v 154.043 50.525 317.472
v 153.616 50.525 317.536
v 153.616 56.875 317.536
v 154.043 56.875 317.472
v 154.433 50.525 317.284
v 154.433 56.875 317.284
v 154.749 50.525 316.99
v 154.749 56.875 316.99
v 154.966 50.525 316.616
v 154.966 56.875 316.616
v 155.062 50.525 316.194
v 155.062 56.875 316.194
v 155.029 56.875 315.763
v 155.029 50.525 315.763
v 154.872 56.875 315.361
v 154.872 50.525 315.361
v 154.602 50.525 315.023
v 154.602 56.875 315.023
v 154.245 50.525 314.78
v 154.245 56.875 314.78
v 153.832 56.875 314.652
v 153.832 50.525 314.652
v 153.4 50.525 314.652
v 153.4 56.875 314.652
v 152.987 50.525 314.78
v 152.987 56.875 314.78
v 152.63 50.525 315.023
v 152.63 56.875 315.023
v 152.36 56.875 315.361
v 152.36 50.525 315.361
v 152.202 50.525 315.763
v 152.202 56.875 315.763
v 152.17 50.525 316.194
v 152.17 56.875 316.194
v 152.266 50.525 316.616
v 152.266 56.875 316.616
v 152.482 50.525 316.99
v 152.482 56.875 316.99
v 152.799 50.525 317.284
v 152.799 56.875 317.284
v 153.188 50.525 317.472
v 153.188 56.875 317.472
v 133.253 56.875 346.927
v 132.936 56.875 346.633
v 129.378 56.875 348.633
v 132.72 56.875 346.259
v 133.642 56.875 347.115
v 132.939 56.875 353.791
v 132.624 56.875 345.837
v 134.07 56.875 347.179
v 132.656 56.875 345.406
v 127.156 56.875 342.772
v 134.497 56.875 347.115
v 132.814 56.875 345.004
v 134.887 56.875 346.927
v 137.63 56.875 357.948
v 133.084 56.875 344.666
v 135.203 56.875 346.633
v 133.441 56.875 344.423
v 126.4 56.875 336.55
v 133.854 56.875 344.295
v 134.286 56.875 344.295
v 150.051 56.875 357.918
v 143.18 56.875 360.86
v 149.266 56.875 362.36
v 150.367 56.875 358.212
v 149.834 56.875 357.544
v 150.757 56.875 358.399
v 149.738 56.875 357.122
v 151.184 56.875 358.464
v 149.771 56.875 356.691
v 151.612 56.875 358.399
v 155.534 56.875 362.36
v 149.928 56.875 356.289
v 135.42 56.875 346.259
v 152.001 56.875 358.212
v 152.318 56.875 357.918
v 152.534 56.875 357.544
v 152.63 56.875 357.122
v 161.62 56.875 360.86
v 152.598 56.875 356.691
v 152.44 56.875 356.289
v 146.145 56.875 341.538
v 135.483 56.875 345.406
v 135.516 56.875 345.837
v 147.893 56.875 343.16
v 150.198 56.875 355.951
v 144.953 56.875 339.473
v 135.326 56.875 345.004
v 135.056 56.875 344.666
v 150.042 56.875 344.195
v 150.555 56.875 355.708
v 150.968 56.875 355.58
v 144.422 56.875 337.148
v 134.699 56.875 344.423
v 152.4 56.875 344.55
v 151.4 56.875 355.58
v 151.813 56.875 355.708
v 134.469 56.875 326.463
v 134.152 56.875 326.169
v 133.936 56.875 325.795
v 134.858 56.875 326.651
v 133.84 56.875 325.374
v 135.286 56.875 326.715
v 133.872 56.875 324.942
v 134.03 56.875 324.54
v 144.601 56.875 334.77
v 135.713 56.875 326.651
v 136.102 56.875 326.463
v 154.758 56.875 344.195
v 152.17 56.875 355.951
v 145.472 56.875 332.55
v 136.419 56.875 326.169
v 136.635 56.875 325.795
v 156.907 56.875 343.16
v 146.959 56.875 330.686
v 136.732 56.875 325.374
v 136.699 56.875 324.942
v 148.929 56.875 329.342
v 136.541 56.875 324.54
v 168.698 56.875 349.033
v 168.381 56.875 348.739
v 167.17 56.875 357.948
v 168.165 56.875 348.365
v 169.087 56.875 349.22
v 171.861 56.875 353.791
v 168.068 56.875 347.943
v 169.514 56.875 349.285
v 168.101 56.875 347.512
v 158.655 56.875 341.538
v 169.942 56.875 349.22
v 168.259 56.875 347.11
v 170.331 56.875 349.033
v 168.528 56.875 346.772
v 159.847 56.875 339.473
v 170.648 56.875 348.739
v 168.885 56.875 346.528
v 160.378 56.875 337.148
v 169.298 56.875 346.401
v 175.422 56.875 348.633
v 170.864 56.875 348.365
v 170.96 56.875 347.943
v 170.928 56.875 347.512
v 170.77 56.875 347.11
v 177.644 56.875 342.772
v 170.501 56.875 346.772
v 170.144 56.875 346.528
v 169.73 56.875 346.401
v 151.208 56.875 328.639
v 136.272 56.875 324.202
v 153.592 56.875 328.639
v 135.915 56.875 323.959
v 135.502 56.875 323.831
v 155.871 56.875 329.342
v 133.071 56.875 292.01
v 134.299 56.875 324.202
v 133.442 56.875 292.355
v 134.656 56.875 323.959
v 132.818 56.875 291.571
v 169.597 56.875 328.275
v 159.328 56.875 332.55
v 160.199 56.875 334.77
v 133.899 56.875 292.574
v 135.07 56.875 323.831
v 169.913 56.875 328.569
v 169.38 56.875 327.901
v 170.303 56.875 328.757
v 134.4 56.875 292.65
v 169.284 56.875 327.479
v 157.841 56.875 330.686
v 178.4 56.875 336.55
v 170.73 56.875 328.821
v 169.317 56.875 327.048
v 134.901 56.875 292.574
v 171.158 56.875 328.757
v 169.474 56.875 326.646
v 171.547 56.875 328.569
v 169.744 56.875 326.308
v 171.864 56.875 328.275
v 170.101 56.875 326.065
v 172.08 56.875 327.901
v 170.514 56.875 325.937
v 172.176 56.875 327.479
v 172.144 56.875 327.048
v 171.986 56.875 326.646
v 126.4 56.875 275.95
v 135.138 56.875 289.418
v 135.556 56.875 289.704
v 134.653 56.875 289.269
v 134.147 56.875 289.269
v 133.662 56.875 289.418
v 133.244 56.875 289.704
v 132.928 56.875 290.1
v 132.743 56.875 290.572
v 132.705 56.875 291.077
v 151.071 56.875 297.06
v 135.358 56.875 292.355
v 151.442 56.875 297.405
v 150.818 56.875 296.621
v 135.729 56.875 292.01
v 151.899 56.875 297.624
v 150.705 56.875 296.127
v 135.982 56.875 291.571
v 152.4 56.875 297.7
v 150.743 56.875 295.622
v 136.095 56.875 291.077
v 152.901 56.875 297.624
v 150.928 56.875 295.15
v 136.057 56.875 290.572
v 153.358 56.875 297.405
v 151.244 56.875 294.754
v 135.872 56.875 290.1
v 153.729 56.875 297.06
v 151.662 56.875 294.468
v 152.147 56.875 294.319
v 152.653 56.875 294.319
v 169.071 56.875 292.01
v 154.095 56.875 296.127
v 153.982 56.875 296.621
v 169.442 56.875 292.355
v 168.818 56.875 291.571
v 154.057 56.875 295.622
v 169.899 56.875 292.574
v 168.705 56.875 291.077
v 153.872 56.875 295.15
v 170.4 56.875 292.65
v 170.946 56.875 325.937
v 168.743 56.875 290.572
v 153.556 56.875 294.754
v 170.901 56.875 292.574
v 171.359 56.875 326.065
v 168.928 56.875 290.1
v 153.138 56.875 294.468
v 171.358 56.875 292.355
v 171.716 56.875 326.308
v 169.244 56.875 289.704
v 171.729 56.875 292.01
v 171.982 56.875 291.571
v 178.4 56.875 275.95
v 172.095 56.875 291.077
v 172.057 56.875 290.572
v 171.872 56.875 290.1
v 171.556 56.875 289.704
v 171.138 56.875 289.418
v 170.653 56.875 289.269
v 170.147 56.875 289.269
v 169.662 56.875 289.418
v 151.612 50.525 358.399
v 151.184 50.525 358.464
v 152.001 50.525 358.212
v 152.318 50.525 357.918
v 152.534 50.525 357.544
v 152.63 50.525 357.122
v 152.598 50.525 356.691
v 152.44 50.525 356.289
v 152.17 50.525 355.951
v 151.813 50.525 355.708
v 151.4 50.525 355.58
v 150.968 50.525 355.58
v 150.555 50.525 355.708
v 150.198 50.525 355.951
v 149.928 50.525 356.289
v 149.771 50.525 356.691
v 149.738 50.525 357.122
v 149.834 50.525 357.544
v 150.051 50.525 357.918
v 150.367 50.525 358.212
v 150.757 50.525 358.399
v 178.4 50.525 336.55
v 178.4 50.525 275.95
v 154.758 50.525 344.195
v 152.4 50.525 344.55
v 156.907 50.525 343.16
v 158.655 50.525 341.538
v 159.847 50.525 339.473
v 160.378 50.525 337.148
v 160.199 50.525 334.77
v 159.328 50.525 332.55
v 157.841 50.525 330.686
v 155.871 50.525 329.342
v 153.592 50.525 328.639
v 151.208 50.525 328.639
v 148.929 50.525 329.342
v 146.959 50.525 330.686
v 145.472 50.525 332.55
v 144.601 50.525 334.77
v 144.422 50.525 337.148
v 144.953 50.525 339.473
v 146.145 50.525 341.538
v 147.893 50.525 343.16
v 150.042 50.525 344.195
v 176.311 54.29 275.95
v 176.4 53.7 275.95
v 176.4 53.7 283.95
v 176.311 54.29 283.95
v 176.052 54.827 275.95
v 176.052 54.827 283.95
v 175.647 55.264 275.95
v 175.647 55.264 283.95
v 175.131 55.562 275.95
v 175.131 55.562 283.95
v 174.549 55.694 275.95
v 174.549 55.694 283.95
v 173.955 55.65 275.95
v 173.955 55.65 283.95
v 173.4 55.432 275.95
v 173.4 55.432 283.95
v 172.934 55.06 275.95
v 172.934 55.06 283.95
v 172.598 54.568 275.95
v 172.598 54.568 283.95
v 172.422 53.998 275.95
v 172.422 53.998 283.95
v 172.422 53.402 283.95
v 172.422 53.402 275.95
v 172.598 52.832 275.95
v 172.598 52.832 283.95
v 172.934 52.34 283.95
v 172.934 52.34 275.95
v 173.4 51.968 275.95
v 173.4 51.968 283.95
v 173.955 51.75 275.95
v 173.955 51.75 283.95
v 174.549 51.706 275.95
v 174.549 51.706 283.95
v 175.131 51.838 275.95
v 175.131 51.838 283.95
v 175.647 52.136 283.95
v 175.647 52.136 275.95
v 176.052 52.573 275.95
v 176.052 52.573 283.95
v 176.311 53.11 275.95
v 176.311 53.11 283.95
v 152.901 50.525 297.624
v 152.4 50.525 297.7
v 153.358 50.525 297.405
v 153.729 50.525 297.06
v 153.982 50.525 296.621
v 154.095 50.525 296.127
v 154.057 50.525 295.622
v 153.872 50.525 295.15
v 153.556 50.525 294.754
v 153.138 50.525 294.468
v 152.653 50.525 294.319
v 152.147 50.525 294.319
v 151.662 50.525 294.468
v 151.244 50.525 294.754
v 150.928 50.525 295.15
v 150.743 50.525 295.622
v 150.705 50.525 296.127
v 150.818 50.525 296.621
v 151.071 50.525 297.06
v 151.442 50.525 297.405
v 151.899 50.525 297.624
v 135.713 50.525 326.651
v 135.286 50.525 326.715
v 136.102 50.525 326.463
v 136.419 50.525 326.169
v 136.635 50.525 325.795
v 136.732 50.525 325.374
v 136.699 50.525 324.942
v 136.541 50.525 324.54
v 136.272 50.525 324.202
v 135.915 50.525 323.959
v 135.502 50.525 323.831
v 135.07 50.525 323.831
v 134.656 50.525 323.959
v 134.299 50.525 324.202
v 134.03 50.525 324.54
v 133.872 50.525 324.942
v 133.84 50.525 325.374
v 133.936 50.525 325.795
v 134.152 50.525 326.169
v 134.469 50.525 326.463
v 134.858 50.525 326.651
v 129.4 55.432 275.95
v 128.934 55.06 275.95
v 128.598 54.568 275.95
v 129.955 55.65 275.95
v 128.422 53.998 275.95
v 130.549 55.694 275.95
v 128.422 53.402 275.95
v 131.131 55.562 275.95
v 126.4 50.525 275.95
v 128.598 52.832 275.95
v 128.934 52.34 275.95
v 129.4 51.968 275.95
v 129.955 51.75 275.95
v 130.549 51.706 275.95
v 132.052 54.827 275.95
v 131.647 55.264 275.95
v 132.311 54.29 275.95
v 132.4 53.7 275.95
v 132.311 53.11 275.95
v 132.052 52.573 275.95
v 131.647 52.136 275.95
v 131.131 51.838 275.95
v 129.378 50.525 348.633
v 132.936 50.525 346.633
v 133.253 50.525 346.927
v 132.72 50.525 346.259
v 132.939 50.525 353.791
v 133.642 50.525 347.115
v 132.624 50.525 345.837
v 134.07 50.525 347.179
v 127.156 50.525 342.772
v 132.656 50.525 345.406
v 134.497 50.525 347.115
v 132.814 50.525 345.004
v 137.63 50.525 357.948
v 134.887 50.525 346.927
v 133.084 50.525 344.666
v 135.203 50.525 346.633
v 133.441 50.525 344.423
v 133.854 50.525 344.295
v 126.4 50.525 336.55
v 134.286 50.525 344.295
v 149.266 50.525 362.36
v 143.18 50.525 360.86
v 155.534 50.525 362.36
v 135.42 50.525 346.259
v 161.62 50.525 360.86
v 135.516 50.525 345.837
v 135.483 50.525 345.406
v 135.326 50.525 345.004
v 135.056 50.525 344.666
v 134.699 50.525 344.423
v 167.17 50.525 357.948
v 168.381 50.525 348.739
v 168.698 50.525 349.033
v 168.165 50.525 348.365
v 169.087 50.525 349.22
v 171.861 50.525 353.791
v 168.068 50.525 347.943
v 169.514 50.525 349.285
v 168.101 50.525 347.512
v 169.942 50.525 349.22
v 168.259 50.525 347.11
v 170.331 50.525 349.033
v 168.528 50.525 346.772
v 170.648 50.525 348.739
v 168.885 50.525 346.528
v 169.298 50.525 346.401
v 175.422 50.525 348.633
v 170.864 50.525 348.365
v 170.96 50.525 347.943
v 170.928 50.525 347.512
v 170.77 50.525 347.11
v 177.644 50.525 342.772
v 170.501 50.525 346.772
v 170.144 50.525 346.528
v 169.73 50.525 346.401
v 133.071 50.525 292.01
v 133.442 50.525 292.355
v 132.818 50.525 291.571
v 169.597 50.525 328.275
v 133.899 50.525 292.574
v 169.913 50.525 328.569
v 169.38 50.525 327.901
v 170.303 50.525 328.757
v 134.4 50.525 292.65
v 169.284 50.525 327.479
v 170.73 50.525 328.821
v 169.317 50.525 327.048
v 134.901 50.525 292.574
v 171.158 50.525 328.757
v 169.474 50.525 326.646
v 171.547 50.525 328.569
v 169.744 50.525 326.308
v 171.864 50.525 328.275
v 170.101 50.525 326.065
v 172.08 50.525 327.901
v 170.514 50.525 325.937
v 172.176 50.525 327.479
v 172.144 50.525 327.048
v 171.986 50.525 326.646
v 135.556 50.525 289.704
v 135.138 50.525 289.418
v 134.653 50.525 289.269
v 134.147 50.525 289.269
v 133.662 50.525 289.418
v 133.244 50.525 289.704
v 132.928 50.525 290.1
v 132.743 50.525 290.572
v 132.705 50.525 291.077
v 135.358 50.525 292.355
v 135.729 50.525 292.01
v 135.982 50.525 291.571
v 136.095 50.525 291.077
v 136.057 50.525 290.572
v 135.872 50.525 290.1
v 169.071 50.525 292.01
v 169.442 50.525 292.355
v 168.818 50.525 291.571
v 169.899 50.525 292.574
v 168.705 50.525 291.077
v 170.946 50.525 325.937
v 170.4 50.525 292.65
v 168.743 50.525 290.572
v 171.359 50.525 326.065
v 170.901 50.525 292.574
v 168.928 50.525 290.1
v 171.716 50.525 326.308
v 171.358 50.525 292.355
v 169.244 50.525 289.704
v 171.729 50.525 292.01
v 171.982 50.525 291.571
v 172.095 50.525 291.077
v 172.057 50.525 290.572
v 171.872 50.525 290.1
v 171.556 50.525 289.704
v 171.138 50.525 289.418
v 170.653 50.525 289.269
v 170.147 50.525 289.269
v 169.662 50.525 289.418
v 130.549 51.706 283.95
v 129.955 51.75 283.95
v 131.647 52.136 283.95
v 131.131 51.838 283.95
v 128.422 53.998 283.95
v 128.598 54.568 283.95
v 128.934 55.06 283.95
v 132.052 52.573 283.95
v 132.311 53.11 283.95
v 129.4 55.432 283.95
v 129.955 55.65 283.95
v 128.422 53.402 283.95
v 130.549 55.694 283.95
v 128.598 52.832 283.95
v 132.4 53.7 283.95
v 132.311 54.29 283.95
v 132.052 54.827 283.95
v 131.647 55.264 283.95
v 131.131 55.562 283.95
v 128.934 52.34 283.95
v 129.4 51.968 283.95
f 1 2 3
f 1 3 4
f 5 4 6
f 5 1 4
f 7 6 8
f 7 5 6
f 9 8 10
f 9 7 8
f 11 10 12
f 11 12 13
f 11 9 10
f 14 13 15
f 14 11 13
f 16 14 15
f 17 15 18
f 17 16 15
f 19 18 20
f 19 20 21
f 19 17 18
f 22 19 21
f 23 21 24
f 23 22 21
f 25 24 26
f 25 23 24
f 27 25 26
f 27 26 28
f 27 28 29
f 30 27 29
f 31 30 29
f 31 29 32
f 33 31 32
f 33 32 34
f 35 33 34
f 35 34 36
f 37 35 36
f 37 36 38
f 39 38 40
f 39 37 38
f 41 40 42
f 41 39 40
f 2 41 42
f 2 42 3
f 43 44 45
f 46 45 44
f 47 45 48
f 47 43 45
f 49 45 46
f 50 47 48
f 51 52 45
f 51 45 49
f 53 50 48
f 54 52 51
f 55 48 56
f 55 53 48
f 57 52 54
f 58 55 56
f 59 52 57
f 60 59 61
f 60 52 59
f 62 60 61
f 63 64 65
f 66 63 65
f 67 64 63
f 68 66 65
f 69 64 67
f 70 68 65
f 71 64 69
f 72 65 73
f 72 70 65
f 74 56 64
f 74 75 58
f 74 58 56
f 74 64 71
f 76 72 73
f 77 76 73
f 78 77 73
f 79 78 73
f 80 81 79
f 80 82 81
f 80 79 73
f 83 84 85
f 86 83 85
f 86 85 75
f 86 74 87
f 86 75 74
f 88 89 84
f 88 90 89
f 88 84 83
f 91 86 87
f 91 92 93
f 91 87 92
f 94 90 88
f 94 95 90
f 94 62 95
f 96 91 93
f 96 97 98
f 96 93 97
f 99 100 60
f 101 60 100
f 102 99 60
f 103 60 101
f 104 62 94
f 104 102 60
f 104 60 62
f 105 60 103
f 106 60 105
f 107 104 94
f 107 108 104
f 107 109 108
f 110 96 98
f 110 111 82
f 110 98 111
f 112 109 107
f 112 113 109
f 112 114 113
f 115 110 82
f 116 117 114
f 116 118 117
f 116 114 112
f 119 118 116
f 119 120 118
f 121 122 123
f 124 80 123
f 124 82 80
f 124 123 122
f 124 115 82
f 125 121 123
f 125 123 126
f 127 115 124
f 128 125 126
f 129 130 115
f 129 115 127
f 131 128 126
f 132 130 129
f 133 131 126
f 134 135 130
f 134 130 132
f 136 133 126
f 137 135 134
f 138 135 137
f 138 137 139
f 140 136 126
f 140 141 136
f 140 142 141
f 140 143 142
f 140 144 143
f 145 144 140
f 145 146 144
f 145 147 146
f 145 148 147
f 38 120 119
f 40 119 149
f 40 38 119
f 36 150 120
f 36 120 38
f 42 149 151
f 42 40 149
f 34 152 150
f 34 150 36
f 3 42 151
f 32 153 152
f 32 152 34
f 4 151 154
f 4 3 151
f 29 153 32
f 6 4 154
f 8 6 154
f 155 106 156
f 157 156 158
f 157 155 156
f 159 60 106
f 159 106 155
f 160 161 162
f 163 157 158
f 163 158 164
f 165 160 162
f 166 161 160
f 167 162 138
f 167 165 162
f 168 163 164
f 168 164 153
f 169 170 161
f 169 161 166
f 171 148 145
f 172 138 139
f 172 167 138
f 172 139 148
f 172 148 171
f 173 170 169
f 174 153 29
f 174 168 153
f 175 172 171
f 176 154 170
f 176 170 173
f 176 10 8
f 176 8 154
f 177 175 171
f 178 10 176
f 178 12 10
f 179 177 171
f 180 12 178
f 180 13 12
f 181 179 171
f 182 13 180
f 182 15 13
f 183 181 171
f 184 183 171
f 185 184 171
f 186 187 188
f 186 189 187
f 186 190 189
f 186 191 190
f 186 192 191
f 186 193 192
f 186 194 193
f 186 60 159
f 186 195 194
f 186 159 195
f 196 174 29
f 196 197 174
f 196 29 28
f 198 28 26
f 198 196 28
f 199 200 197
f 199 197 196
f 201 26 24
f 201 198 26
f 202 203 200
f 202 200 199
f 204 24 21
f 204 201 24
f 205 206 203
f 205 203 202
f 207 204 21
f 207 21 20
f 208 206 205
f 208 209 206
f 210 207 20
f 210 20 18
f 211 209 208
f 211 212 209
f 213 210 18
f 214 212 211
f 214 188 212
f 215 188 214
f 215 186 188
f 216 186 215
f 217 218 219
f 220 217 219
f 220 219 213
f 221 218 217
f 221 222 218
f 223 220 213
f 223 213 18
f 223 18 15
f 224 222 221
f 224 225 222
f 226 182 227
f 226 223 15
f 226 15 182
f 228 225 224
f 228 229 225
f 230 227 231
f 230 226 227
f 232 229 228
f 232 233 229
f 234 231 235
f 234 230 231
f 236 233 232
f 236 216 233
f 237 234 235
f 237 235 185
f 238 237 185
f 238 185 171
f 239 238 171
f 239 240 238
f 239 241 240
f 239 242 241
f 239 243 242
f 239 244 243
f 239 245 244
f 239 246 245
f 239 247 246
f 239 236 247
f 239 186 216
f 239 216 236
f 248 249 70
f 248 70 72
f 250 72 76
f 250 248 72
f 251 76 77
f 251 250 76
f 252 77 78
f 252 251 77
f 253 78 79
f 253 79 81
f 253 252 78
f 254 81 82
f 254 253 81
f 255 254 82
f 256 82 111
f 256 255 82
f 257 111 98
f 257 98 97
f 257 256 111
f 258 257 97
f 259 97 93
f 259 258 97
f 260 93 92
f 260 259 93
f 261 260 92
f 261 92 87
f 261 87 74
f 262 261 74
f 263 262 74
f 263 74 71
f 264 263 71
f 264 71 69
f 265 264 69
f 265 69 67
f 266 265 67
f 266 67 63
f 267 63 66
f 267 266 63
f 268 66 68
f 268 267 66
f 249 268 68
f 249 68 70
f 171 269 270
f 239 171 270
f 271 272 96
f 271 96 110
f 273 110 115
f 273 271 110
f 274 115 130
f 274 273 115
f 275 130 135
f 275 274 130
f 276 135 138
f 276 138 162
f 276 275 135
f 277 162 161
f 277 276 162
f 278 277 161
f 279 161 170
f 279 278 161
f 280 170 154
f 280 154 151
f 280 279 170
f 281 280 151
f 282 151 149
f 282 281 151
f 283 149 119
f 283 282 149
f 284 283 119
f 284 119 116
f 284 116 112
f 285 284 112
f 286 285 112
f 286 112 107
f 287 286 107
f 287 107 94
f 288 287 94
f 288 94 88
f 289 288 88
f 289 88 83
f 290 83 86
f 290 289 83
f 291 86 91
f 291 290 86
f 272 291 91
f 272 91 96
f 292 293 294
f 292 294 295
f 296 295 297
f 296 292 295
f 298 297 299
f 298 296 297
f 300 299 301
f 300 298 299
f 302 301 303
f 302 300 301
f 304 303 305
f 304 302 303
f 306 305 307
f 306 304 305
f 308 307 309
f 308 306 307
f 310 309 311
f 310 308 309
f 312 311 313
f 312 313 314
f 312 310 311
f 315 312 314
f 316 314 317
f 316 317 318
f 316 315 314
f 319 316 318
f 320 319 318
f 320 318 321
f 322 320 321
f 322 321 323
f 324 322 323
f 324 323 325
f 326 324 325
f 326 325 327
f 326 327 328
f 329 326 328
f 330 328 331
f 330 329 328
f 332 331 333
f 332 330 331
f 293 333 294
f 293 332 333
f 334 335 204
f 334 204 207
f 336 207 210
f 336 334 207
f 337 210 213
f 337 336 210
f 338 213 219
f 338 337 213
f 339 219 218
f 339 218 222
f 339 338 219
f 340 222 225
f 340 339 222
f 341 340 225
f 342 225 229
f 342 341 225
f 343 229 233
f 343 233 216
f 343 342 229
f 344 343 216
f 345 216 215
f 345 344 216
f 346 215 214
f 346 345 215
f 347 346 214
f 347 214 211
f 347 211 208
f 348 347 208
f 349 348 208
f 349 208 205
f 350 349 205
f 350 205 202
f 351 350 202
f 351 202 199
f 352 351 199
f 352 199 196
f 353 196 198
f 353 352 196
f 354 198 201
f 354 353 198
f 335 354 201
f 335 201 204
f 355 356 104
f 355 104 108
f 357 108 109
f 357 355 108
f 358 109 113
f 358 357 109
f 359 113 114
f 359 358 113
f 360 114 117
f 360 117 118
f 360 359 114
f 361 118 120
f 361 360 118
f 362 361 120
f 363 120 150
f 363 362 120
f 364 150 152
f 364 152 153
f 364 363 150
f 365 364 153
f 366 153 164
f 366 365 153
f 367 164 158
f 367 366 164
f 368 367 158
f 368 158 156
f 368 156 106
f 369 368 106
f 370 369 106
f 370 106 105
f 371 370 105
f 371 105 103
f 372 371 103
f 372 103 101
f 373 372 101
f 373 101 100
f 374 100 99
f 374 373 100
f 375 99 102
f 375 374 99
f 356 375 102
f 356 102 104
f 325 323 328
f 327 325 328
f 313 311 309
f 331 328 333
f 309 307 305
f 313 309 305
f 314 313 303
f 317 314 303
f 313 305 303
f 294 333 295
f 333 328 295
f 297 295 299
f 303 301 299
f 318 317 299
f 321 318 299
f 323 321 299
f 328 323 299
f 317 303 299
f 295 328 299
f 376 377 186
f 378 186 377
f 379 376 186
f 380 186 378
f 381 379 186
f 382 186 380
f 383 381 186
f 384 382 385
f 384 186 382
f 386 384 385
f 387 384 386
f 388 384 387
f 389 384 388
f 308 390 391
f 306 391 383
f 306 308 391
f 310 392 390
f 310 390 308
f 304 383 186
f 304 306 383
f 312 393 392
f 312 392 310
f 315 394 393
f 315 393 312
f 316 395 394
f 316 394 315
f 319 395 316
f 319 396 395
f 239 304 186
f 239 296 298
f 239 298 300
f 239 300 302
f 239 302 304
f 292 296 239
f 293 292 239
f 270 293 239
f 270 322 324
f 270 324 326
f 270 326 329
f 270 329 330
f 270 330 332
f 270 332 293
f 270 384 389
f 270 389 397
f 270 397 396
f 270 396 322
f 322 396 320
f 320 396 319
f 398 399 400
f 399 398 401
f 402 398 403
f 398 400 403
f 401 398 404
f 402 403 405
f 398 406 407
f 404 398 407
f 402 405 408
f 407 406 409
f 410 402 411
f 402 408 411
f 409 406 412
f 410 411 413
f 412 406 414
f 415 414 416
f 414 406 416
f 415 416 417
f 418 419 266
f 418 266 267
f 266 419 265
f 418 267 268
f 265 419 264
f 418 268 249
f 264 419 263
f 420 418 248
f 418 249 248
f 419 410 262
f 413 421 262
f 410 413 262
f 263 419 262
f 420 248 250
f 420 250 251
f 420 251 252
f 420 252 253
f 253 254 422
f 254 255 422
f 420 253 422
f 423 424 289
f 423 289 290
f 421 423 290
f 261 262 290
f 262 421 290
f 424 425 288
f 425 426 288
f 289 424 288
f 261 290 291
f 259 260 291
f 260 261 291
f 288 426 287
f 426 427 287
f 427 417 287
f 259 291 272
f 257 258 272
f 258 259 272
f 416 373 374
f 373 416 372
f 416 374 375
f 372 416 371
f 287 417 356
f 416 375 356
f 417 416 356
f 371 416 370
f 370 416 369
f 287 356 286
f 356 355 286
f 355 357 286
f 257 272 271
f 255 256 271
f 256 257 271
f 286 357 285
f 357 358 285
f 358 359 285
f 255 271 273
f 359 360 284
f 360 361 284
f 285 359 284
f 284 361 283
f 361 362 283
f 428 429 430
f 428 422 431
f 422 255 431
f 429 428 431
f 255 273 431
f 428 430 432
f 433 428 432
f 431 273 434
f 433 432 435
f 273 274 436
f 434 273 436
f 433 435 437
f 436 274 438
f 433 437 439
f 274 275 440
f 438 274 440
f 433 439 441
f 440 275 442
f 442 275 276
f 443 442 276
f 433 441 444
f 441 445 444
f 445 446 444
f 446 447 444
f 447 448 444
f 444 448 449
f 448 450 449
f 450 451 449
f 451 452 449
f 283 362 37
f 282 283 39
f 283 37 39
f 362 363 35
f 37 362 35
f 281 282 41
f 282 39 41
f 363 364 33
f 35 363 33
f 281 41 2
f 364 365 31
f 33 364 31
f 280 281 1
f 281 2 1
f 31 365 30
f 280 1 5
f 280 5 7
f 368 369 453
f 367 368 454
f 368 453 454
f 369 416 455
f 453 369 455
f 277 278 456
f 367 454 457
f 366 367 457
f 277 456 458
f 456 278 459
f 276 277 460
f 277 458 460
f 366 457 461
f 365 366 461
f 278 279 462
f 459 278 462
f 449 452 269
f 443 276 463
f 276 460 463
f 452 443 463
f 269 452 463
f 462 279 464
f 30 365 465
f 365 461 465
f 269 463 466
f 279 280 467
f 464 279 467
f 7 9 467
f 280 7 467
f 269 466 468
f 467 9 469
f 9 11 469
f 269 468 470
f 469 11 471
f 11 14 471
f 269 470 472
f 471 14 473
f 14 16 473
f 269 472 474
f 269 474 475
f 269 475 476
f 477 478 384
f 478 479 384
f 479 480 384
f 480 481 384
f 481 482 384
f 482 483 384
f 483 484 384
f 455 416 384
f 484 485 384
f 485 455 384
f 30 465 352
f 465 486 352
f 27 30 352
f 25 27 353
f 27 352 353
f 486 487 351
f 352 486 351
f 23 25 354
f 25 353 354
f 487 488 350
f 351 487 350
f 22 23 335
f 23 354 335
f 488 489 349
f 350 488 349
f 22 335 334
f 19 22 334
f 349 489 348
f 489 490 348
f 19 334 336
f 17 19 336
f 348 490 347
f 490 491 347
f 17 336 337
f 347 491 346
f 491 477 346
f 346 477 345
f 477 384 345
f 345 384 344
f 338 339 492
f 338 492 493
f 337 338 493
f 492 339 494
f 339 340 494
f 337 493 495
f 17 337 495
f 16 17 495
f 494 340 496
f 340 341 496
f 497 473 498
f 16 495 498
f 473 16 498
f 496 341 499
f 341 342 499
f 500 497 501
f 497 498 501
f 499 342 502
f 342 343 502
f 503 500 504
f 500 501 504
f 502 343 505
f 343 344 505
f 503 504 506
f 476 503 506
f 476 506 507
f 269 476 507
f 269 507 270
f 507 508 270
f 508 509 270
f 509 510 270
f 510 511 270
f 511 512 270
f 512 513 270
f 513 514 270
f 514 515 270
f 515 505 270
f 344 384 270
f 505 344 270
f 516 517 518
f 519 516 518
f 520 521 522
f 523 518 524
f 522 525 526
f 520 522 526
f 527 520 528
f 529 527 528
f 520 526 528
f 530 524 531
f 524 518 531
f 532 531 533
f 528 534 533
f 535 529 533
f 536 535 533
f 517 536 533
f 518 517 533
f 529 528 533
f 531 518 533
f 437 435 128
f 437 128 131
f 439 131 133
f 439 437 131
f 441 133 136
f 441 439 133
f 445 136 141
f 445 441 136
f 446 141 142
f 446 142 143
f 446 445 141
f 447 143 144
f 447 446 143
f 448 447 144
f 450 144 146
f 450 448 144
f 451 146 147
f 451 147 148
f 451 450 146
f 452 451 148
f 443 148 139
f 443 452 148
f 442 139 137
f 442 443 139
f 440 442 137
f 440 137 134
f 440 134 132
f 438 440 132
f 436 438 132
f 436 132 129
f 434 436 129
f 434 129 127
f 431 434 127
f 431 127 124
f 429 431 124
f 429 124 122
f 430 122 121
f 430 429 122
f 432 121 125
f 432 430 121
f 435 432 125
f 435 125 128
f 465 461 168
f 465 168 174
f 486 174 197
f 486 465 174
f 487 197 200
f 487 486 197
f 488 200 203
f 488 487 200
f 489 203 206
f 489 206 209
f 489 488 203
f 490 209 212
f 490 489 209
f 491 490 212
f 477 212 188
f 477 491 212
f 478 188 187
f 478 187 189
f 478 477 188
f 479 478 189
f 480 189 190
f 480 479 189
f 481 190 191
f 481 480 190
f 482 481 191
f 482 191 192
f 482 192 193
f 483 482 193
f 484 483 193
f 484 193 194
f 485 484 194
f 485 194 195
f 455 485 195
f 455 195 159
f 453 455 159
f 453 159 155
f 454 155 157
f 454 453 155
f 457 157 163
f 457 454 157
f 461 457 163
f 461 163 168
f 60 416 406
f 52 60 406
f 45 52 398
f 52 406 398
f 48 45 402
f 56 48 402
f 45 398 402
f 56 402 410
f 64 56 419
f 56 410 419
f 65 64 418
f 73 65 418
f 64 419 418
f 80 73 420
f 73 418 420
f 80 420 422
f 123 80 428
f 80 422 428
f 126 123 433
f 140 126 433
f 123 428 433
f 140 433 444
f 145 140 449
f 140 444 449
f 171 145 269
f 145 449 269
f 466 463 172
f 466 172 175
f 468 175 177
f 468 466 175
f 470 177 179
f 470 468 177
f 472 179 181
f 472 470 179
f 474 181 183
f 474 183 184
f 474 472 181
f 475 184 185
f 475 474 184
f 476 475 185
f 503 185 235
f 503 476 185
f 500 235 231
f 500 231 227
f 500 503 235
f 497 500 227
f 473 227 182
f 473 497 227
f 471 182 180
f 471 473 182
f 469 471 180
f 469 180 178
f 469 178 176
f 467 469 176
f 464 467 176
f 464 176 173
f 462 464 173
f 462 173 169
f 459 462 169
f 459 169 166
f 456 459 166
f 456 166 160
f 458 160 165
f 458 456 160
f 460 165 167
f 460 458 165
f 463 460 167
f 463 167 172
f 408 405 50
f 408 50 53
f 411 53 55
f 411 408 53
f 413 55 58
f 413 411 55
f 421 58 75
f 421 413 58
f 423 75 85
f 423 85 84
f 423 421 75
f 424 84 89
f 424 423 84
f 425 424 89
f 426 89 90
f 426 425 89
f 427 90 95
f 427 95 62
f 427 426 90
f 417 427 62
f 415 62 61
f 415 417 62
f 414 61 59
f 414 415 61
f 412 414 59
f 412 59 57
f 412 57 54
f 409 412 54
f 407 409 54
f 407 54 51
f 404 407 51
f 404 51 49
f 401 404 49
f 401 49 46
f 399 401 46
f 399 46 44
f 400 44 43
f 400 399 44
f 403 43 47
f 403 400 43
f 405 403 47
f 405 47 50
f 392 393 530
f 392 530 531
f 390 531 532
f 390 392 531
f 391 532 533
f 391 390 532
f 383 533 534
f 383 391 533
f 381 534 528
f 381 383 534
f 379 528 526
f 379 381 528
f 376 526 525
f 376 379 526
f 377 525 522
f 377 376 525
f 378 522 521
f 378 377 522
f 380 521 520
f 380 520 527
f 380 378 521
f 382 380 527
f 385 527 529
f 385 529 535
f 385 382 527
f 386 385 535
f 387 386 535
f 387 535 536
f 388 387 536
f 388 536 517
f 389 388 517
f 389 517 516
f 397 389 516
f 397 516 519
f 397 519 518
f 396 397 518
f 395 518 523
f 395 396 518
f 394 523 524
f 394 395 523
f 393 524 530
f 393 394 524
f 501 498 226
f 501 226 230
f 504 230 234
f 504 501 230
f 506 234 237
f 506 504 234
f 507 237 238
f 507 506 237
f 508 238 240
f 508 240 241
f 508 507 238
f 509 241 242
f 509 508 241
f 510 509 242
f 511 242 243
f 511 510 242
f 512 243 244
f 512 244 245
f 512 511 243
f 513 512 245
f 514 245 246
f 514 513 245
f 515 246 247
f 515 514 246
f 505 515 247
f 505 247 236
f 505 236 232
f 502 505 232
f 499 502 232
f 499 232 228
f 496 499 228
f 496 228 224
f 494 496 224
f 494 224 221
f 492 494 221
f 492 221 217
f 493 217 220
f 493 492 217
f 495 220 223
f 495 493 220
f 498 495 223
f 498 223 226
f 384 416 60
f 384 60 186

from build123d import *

# Parameters (mm, degrees)
PARED_A_MOTOR_J5_START           = 50.525
CROQUIS1_W                       = 52
CROQUIS1_H                       = 60.6
PARED_A_MOTOR_J5_DEPTH           = 6.35
PARED_A_MOTOR_J5_REDONDEO_START  = 50.525
CROQUIS2_R                       = 26
PARED_A_MOTOR_J5_REDONDEO_DEPTH  = 6.35
BARRENOS_M5_START                = 50.525
CROQUIS3_R                       = 1.45
CROQUIS3_R_2                     = 8
BARRENOS_M5_DEPTH                = 6.35
ROSCA_M3_ESCUADRAS_START         = 50.525
CROQUIS4_R                       = 1.25
ROSCA_M3_ESCUADRAS_DEPTH         = 6.35
PASADORES_D4_START               = 275.95
CROQUIS5_R                       = 2
PASADORES_D4_DEPTH               = 8
ROSCA_M3_BASES_CINCHO_START      = 50.525
CROQUIS6_R                       = 1.25
ROSCA_M3_BASES_CINCHO_DEPTH      = 6.35
PASO_M3_ESCUADRAS_TUERCA_START   = 50.525
CROQUIS7_R                       = 1.7
PASO_M3_ESCUADRAS_TUERCA_DEPTH   = 6.35
PASO_M3_BASE_CINCHO_TUERCA_START = 50.525
CROQUIS8_R                       = 1.7
PASO_M3_BASE_CINCHO_TUERCA_DEPTH = 6.35


with BuildPart() as part:
    # Croquis1 → Pared_A_motor_J5 (new body)
    with BuildSketch(Plane(origin=(0, 0, 0), x_dir=(1, 0, 0), z_dir=(0, 1, 0)).offset(PARED_A_MOTOR_J5_START)):
        with Locations((152.4, -306.25)):
            Rectangle(CROQUIS1_W, CROQUIS1_H)
    extrude(amount=PARED_A_MOTOR_J5_DEPTH)

    # Croquis2 → Pared_A_motor_J5_redondeo (add)
    with BuildSketch(Plane(origin=(0, 0, 0), x_dir=(1, 0, 0), z_dir=(0, 1, 0)).offset(PARED_A_MOTOR_J5_REDONDEO_START)):
        with Locations((152.4, -336.55)):
            Circle(CROQUIS2_R)
    extrude(amount=PARED_A_MOTOR_J5_REDONDEO_DEPTH)

    # Croquis3 → Barrenos_M5 (cut)
    with BuildSketch(Plane(origin=(0, 0, 0), x_dir=(1, 0, 0), z_dir=(0, 1, 0)).offset(BARRENOS_M5_START)):
        with Locations(Location((169.514381197, -347.834855172, 0), (0, 0, 270))):
            Circle(CROQUIS3_R)
        with Locations(Location((151.184219342, -357.013916472, 0), (0, 0, 270))):
            Circle(CROQUIS3_R)
        with Locations(Location((134.069838145, -345.729061301, 0), (0, 0, 270))):
            Circle(CROQUIS3_R)
        with Locations(Location((135.285618803, -325.265144828, 0), (0, 0, 270))):
            Circle(CROQUIS3_R)
        with Locations(Location((153.615780658, -316.086083528, 0), (0, 0, 270))):
            Circle(CROQUIS3_R)
        with Locations(Location((170.730161855, -327.370938699, 0), (0, 0, 270))):
            Circle(CROQUIS3_R)
        with Locations(Location((152.4, -336.55, 0), (0, 0, 270))):
            Circle(CROQUIS3_R_2)
    extrude(amount=BARRENOS_M5_DEPTH, mode=Mode.SUBTRACT)

    # Croquis4 → Rosca_M3_escuadras (cut)
    with BuildSketch(Plane(origin=(0, 0, 0), x_dir=(1, 0, 0), z_dir=(0, 1, 0)).offset(ROSCA_M3_ESCUADRAS_START)):
        with Locations(Location((134.4, -290.95, 0), (0, 0, 270))):
            Circle(CROQUIS4_R)
        with Locations(Location((170.4, -290.95, 0), (0, 0, 270))):
            Circle(CROQUIS4_R)
    extrude(amount=ROSCA_M3_ESCUADRAS_DEPTH, mode=Mode.SUBTRACT)

    # Croquis5 → Pasadores_D4 (cut)
    with BuildSketch(Plane.XY.offset(PASADORES_D4_START)):
        with Locations((130.4, 53.7)):
            Circle(CROQUIS5_R)
        with Locations((174.4, 53.7)):
            Circle(CROQUIS5_R)
    extrude(amount=PASADORES_D4_DEPTH, mode=Mode.SUBTRACT)

    # Croquis6 → Rosca_M3_bases_cincho (cut)
    with BuildSketch(Plane(origin=(0, 0, 0), x_dir=(1, 0, 0), z_dir=(0, 1, 0)).offset(ROSCA_M3_BASES_CINCHO_START)):
        with Locations(Location((152.4, -296, 0), (0, 0, 270))):
            Circle(CROQUIS6_R)
    extrude(amount=ROSCA_M3_BASES_CINCHO_DEPTH, mode=Mode.SUBTRACT)

    # Croquis7 → Paso_M3_escuadras_tuerca (cut)
    with BuildSketch(Plane(origin=(0, 0, 0), x_dir=(1, 0, 0), z_dir=(0, 1, 0)).offset(PASO_M3_ESCUADRAS_TUERCA_START)):
        with Locations(Location((134.4, -290.95, 0), (0, 0, 270))):
            Circle(CROQUIS7_R)
        with Locations(Location((170.4, -290.95, 0), (0, 0, 270))):
            Circle(CROQUIS7_R)
    extrude(amount=PASO_M3_ESCUADRAS_TUERCA_DEPTH, mode=Mode.SUBTRACT)

    # Croquis8 → Paso_M3_base_cincho_tuerca (cut)
    with BuildSketch(Plane(origin=(0, 0, 0), x_dir=(1, 0, 0), z_dir=(0, 1, 0)).offset(PASO_M3_BASE_CINCHO_TUERCA_START)):
        with Locations(Location((152.4, -296, 0), (0, 0, 270))):
            Circle(CROQUIS8_R)
    extrude(amount=PASO_M3_BASE_CINCHO_TUERCA_DEPTH, mode=Mode.SUBTRACT)


solid = part.part
